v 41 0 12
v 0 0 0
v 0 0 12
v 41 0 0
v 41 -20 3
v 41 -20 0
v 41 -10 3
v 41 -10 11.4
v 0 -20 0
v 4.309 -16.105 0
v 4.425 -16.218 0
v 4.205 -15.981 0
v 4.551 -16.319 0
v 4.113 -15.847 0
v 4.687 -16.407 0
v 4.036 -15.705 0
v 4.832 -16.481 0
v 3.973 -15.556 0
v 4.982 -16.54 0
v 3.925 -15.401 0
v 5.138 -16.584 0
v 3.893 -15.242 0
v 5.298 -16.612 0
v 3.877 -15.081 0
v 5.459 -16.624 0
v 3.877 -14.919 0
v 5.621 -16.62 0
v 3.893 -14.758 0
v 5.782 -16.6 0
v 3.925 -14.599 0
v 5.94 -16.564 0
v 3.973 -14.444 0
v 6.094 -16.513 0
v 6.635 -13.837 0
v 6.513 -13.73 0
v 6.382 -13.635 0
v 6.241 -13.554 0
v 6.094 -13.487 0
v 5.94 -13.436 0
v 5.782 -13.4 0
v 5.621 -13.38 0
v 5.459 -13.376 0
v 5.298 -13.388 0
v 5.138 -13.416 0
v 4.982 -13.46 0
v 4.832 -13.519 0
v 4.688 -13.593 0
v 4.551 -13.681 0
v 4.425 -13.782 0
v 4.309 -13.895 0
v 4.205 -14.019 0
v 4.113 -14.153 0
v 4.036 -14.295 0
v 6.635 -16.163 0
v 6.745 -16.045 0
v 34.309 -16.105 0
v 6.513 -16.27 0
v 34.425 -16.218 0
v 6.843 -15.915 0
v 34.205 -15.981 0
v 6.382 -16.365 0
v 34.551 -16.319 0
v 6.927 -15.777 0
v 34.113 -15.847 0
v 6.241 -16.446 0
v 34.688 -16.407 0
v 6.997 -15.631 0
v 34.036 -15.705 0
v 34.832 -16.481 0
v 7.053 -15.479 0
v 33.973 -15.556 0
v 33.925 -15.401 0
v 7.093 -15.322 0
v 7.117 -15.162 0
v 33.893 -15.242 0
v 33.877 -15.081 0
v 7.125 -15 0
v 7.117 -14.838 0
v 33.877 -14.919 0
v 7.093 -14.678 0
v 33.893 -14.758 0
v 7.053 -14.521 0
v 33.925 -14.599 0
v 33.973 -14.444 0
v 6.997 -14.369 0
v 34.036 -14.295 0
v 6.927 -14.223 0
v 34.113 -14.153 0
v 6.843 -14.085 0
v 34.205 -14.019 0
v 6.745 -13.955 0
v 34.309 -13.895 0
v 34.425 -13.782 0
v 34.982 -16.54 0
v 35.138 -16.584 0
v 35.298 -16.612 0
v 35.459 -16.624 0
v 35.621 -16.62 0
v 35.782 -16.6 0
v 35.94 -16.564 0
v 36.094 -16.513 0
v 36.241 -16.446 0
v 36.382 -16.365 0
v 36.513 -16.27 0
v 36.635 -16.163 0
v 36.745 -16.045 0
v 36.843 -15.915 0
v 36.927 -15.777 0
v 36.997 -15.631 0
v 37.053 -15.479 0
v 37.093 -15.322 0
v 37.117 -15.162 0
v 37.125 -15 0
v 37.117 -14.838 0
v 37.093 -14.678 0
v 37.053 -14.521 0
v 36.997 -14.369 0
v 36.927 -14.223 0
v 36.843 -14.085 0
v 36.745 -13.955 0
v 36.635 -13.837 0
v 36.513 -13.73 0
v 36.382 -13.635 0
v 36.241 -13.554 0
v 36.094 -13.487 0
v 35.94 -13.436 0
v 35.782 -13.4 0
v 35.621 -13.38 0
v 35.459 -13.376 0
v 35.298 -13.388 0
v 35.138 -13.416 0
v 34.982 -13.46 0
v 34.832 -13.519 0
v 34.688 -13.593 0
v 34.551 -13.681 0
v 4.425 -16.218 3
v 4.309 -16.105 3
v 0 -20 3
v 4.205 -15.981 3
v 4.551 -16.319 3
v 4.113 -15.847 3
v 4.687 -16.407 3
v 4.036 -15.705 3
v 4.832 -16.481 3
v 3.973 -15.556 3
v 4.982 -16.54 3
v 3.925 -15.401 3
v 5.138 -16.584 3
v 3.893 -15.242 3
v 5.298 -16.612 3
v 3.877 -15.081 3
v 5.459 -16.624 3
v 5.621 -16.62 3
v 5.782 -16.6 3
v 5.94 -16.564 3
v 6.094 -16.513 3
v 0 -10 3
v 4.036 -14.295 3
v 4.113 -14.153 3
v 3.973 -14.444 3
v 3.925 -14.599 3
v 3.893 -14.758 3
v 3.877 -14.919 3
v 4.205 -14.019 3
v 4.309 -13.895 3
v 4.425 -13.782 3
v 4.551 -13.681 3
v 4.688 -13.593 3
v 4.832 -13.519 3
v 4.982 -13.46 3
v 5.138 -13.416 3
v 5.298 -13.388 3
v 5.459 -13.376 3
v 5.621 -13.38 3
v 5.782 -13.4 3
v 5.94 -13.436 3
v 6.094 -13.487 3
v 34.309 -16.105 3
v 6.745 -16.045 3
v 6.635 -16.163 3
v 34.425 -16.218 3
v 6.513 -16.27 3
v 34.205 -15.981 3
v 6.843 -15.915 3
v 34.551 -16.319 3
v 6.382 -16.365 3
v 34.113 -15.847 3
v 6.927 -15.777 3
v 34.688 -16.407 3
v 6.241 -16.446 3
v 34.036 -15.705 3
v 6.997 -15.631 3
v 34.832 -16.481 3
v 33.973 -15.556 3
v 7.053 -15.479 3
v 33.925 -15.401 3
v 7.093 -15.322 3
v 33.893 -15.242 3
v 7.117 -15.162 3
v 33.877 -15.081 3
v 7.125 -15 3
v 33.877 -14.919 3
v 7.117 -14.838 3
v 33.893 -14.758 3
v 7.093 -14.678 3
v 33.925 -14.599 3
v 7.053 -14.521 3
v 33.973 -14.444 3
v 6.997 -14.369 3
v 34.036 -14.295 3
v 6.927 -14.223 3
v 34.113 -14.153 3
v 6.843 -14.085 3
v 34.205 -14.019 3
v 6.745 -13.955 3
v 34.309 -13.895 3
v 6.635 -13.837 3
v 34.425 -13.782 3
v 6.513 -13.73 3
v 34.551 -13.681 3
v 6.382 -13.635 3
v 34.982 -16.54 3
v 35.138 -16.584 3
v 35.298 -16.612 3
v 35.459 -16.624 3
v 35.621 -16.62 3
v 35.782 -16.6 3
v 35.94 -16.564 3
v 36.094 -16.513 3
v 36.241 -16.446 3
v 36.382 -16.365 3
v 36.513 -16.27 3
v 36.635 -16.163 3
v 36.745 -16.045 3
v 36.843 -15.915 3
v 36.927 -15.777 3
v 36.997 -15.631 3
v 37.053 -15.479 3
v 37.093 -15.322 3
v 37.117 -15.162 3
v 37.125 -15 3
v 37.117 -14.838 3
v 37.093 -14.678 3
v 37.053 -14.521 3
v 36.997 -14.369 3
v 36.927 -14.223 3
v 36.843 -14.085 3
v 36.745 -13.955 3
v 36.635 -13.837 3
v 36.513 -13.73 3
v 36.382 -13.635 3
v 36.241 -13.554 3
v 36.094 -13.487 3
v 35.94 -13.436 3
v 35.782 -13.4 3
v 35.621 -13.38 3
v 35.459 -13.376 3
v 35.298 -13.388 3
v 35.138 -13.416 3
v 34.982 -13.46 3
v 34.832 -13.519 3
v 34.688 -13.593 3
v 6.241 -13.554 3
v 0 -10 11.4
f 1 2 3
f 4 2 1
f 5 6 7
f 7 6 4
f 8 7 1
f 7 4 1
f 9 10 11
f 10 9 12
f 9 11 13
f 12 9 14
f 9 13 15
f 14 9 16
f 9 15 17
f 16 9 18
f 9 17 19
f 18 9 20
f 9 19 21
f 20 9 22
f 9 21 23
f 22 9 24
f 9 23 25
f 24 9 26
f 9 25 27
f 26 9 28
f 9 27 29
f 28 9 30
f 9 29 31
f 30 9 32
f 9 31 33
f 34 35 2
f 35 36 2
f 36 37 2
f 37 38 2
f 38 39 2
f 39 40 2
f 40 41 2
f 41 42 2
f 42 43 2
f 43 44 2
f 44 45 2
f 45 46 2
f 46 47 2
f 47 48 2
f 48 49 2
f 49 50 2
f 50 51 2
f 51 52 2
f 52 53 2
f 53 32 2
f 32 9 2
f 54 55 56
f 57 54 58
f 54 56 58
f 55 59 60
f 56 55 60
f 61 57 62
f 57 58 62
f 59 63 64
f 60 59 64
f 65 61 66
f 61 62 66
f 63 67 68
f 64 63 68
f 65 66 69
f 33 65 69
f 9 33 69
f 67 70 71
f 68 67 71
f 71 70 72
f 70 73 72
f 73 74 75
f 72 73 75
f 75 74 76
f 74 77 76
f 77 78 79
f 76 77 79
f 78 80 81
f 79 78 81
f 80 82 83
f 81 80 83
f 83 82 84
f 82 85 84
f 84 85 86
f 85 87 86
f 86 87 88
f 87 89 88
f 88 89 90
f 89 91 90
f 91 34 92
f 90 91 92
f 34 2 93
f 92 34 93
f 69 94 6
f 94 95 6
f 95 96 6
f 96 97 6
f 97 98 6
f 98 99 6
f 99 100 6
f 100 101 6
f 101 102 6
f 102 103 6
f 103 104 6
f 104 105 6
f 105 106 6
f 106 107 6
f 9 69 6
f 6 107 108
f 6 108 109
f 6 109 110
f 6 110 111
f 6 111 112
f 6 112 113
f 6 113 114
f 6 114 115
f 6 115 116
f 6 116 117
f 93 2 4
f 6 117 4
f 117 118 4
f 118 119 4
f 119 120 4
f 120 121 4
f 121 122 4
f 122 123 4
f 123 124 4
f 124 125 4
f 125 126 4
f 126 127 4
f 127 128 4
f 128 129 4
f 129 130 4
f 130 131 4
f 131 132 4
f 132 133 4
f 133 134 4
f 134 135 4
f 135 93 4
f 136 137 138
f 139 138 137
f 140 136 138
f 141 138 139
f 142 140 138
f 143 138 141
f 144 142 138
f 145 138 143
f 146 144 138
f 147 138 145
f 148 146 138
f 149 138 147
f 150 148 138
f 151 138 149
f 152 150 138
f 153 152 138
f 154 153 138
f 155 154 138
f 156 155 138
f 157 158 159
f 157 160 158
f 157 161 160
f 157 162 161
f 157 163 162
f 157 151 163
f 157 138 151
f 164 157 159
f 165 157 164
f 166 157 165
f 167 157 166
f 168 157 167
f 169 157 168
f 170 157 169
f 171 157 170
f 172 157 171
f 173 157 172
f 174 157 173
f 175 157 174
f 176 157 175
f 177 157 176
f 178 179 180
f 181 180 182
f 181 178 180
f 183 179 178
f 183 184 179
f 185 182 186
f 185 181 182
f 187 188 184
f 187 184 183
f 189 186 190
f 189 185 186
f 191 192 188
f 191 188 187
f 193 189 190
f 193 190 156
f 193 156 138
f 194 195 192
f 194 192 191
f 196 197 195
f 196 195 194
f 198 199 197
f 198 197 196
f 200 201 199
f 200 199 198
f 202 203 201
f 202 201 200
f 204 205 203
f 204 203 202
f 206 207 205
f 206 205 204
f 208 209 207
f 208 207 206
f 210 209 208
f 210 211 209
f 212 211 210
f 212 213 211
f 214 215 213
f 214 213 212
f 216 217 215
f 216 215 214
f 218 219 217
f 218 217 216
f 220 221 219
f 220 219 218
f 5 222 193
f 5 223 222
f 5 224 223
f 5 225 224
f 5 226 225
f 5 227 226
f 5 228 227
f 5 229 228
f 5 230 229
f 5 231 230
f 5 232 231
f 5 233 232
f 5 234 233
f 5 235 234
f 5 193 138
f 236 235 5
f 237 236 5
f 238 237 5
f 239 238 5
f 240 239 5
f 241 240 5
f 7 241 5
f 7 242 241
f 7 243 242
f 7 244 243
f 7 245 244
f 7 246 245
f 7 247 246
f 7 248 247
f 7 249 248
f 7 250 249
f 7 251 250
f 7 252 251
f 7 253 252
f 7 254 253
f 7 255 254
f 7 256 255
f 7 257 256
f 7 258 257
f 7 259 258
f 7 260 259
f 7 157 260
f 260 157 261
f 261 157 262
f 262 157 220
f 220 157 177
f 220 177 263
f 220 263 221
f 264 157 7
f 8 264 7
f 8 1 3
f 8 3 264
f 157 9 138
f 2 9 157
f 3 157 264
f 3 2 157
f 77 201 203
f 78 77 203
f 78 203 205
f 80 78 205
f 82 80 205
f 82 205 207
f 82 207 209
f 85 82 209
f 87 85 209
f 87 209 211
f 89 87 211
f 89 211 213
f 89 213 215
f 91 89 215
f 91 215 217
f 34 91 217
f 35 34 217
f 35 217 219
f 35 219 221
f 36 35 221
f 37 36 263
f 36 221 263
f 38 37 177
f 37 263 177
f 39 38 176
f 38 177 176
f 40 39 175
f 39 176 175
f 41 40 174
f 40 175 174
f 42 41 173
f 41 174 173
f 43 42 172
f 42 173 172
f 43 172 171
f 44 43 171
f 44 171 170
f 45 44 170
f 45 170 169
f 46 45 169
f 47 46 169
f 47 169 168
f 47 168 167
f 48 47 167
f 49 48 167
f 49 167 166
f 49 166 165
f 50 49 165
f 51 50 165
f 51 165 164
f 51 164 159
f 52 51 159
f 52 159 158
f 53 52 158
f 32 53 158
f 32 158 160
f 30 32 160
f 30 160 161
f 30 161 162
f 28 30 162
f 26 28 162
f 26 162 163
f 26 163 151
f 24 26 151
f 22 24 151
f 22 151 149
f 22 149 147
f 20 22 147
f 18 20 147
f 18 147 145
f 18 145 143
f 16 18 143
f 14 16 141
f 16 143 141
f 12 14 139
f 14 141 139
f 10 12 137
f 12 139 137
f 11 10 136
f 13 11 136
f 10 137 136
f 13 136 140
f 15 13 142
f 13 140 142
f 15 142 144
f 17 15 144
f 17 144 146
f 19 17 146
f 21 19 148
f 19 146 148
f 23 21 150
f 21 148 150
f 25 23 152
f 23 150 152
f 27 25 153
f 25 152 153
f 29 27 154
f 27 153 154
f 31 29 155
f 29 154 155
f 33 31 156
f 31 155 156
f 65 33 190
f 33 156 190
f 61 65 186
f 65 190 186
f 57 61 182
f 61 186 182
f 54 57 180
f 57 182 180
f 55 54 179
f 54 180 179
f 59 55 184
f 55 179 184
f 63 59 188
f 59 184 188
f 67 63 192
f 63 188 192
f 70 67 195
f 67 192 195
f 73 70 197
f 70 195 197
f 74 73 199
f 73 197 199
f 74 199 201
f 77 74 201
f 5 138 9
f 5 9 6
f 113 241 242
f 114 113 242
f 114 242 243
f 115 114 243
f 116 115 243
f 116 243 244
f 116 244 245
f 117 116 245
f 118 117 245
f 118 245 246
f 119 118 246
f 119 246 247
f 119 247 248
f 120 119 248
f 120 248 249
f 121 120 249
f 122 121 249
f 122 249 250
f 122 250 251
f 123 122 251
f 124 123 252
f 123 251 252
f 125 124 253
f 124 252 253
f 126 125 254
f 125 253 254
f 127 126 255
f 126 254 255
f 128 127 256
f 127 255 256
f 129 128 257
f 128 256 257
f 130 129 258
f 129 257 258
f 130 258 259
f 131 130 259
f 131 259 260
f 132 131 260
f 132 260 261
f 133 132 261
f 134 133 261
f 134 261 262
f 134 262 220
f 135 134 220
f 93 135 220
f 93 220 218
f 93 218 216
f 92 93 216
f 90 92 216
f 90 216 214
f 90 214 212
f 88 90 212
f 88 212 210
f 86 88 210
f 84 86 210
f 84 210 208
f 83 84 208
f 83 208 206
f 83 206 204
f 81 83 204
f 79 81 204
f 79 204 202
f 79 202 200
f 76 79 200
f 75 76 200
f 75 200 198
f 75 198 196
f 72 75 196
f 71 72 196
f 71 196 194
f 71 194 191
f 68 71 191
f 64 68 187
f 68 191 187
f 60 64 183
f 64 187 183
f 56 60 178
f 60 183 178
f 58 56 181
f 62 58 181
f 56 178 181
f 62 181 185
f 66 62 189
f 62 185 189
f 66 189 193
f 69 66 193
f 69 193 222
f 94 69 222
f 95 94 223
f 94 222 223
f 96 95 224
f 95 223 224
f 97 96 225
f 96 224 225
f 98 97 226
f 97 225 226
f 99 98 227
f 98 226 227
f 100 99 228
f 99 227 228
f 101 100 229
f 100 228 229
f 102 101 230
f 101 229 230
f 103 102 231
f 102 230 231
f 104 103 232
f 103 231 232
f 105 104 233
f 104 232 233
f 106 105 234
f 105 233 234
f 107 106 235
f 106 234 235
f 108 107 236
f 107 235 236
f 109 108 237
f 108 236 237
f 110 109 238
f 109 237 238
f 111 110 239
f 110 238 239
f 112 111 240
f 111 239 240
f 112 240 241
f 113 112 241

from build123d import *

# Parameters (mm, degrees)
ESQUISSE1_W             = 41
ESQUISSE1_H             = 10
BOSS_EXTRU_1_DEPTH      = 12
ESQUISSE2_W             = 41
ESQUISSE2_H             = 3
BOSS_EXTRU_2_DEPTH      = 10
ESQUISSE3_R             = 1.625
ENL_V_MAT_EXTRU_1_DEPTH = 10
ENL_V_MAT_EXTRU_2_DEPTH = 42


with BuildPart() as part:
    # Esquisse1 → Boss.-Extru.1 (new body)
    with BuildSketch(Plane.XY):
        with Locations((20.5, -5)):
            Rectangle(ESQUISSE1_W, ESQUISSE1_H)
    extrude(amount=BOSS_EXTRU_1_DEPTH)

    # Esquisse2 → Boss.-Extru.2 (add)
    with BuildSketch(Plane.XZ.offset(10)):
        with Locations((20.5, 1.5)):
            Rectangle(ESQUISSE2_W, ESQUISSE2_H)
    extrude(amount=BOSS_EXTRU_2_DEPTH)

    # Esquisse3 → Enlèv. mat.-Extru.1 (cut)
    with BuildSketch(Plane.XY.offset(3)):
        with Locations((5.5, -15)):
            Circle(ESQUISSE3_R)
        with Locations((35.5, -15)):
            Circle(ESQUISSE3_R)
    extrude(amount=-ENL_V_MAT_EXTRU_1_DEPTH, mode=Mode.SUBTRACT)

    # Esquisse4 → Enlèv. mat.-Extru.2 (cut, through all)
    with BuildSketch(Plane(origin=(41, 0, 0), x_dir=(0, 0, -1), z_dir=(1, 0, 0))):
        Polygon((-12, 0), (-11.4, -10), (-12, -10), align=None)
    extrude(amount=-ENL_V_MAT_EXTRU_2_DEPTH, mode=Mode.SUBTRACT)


solid = part.part
